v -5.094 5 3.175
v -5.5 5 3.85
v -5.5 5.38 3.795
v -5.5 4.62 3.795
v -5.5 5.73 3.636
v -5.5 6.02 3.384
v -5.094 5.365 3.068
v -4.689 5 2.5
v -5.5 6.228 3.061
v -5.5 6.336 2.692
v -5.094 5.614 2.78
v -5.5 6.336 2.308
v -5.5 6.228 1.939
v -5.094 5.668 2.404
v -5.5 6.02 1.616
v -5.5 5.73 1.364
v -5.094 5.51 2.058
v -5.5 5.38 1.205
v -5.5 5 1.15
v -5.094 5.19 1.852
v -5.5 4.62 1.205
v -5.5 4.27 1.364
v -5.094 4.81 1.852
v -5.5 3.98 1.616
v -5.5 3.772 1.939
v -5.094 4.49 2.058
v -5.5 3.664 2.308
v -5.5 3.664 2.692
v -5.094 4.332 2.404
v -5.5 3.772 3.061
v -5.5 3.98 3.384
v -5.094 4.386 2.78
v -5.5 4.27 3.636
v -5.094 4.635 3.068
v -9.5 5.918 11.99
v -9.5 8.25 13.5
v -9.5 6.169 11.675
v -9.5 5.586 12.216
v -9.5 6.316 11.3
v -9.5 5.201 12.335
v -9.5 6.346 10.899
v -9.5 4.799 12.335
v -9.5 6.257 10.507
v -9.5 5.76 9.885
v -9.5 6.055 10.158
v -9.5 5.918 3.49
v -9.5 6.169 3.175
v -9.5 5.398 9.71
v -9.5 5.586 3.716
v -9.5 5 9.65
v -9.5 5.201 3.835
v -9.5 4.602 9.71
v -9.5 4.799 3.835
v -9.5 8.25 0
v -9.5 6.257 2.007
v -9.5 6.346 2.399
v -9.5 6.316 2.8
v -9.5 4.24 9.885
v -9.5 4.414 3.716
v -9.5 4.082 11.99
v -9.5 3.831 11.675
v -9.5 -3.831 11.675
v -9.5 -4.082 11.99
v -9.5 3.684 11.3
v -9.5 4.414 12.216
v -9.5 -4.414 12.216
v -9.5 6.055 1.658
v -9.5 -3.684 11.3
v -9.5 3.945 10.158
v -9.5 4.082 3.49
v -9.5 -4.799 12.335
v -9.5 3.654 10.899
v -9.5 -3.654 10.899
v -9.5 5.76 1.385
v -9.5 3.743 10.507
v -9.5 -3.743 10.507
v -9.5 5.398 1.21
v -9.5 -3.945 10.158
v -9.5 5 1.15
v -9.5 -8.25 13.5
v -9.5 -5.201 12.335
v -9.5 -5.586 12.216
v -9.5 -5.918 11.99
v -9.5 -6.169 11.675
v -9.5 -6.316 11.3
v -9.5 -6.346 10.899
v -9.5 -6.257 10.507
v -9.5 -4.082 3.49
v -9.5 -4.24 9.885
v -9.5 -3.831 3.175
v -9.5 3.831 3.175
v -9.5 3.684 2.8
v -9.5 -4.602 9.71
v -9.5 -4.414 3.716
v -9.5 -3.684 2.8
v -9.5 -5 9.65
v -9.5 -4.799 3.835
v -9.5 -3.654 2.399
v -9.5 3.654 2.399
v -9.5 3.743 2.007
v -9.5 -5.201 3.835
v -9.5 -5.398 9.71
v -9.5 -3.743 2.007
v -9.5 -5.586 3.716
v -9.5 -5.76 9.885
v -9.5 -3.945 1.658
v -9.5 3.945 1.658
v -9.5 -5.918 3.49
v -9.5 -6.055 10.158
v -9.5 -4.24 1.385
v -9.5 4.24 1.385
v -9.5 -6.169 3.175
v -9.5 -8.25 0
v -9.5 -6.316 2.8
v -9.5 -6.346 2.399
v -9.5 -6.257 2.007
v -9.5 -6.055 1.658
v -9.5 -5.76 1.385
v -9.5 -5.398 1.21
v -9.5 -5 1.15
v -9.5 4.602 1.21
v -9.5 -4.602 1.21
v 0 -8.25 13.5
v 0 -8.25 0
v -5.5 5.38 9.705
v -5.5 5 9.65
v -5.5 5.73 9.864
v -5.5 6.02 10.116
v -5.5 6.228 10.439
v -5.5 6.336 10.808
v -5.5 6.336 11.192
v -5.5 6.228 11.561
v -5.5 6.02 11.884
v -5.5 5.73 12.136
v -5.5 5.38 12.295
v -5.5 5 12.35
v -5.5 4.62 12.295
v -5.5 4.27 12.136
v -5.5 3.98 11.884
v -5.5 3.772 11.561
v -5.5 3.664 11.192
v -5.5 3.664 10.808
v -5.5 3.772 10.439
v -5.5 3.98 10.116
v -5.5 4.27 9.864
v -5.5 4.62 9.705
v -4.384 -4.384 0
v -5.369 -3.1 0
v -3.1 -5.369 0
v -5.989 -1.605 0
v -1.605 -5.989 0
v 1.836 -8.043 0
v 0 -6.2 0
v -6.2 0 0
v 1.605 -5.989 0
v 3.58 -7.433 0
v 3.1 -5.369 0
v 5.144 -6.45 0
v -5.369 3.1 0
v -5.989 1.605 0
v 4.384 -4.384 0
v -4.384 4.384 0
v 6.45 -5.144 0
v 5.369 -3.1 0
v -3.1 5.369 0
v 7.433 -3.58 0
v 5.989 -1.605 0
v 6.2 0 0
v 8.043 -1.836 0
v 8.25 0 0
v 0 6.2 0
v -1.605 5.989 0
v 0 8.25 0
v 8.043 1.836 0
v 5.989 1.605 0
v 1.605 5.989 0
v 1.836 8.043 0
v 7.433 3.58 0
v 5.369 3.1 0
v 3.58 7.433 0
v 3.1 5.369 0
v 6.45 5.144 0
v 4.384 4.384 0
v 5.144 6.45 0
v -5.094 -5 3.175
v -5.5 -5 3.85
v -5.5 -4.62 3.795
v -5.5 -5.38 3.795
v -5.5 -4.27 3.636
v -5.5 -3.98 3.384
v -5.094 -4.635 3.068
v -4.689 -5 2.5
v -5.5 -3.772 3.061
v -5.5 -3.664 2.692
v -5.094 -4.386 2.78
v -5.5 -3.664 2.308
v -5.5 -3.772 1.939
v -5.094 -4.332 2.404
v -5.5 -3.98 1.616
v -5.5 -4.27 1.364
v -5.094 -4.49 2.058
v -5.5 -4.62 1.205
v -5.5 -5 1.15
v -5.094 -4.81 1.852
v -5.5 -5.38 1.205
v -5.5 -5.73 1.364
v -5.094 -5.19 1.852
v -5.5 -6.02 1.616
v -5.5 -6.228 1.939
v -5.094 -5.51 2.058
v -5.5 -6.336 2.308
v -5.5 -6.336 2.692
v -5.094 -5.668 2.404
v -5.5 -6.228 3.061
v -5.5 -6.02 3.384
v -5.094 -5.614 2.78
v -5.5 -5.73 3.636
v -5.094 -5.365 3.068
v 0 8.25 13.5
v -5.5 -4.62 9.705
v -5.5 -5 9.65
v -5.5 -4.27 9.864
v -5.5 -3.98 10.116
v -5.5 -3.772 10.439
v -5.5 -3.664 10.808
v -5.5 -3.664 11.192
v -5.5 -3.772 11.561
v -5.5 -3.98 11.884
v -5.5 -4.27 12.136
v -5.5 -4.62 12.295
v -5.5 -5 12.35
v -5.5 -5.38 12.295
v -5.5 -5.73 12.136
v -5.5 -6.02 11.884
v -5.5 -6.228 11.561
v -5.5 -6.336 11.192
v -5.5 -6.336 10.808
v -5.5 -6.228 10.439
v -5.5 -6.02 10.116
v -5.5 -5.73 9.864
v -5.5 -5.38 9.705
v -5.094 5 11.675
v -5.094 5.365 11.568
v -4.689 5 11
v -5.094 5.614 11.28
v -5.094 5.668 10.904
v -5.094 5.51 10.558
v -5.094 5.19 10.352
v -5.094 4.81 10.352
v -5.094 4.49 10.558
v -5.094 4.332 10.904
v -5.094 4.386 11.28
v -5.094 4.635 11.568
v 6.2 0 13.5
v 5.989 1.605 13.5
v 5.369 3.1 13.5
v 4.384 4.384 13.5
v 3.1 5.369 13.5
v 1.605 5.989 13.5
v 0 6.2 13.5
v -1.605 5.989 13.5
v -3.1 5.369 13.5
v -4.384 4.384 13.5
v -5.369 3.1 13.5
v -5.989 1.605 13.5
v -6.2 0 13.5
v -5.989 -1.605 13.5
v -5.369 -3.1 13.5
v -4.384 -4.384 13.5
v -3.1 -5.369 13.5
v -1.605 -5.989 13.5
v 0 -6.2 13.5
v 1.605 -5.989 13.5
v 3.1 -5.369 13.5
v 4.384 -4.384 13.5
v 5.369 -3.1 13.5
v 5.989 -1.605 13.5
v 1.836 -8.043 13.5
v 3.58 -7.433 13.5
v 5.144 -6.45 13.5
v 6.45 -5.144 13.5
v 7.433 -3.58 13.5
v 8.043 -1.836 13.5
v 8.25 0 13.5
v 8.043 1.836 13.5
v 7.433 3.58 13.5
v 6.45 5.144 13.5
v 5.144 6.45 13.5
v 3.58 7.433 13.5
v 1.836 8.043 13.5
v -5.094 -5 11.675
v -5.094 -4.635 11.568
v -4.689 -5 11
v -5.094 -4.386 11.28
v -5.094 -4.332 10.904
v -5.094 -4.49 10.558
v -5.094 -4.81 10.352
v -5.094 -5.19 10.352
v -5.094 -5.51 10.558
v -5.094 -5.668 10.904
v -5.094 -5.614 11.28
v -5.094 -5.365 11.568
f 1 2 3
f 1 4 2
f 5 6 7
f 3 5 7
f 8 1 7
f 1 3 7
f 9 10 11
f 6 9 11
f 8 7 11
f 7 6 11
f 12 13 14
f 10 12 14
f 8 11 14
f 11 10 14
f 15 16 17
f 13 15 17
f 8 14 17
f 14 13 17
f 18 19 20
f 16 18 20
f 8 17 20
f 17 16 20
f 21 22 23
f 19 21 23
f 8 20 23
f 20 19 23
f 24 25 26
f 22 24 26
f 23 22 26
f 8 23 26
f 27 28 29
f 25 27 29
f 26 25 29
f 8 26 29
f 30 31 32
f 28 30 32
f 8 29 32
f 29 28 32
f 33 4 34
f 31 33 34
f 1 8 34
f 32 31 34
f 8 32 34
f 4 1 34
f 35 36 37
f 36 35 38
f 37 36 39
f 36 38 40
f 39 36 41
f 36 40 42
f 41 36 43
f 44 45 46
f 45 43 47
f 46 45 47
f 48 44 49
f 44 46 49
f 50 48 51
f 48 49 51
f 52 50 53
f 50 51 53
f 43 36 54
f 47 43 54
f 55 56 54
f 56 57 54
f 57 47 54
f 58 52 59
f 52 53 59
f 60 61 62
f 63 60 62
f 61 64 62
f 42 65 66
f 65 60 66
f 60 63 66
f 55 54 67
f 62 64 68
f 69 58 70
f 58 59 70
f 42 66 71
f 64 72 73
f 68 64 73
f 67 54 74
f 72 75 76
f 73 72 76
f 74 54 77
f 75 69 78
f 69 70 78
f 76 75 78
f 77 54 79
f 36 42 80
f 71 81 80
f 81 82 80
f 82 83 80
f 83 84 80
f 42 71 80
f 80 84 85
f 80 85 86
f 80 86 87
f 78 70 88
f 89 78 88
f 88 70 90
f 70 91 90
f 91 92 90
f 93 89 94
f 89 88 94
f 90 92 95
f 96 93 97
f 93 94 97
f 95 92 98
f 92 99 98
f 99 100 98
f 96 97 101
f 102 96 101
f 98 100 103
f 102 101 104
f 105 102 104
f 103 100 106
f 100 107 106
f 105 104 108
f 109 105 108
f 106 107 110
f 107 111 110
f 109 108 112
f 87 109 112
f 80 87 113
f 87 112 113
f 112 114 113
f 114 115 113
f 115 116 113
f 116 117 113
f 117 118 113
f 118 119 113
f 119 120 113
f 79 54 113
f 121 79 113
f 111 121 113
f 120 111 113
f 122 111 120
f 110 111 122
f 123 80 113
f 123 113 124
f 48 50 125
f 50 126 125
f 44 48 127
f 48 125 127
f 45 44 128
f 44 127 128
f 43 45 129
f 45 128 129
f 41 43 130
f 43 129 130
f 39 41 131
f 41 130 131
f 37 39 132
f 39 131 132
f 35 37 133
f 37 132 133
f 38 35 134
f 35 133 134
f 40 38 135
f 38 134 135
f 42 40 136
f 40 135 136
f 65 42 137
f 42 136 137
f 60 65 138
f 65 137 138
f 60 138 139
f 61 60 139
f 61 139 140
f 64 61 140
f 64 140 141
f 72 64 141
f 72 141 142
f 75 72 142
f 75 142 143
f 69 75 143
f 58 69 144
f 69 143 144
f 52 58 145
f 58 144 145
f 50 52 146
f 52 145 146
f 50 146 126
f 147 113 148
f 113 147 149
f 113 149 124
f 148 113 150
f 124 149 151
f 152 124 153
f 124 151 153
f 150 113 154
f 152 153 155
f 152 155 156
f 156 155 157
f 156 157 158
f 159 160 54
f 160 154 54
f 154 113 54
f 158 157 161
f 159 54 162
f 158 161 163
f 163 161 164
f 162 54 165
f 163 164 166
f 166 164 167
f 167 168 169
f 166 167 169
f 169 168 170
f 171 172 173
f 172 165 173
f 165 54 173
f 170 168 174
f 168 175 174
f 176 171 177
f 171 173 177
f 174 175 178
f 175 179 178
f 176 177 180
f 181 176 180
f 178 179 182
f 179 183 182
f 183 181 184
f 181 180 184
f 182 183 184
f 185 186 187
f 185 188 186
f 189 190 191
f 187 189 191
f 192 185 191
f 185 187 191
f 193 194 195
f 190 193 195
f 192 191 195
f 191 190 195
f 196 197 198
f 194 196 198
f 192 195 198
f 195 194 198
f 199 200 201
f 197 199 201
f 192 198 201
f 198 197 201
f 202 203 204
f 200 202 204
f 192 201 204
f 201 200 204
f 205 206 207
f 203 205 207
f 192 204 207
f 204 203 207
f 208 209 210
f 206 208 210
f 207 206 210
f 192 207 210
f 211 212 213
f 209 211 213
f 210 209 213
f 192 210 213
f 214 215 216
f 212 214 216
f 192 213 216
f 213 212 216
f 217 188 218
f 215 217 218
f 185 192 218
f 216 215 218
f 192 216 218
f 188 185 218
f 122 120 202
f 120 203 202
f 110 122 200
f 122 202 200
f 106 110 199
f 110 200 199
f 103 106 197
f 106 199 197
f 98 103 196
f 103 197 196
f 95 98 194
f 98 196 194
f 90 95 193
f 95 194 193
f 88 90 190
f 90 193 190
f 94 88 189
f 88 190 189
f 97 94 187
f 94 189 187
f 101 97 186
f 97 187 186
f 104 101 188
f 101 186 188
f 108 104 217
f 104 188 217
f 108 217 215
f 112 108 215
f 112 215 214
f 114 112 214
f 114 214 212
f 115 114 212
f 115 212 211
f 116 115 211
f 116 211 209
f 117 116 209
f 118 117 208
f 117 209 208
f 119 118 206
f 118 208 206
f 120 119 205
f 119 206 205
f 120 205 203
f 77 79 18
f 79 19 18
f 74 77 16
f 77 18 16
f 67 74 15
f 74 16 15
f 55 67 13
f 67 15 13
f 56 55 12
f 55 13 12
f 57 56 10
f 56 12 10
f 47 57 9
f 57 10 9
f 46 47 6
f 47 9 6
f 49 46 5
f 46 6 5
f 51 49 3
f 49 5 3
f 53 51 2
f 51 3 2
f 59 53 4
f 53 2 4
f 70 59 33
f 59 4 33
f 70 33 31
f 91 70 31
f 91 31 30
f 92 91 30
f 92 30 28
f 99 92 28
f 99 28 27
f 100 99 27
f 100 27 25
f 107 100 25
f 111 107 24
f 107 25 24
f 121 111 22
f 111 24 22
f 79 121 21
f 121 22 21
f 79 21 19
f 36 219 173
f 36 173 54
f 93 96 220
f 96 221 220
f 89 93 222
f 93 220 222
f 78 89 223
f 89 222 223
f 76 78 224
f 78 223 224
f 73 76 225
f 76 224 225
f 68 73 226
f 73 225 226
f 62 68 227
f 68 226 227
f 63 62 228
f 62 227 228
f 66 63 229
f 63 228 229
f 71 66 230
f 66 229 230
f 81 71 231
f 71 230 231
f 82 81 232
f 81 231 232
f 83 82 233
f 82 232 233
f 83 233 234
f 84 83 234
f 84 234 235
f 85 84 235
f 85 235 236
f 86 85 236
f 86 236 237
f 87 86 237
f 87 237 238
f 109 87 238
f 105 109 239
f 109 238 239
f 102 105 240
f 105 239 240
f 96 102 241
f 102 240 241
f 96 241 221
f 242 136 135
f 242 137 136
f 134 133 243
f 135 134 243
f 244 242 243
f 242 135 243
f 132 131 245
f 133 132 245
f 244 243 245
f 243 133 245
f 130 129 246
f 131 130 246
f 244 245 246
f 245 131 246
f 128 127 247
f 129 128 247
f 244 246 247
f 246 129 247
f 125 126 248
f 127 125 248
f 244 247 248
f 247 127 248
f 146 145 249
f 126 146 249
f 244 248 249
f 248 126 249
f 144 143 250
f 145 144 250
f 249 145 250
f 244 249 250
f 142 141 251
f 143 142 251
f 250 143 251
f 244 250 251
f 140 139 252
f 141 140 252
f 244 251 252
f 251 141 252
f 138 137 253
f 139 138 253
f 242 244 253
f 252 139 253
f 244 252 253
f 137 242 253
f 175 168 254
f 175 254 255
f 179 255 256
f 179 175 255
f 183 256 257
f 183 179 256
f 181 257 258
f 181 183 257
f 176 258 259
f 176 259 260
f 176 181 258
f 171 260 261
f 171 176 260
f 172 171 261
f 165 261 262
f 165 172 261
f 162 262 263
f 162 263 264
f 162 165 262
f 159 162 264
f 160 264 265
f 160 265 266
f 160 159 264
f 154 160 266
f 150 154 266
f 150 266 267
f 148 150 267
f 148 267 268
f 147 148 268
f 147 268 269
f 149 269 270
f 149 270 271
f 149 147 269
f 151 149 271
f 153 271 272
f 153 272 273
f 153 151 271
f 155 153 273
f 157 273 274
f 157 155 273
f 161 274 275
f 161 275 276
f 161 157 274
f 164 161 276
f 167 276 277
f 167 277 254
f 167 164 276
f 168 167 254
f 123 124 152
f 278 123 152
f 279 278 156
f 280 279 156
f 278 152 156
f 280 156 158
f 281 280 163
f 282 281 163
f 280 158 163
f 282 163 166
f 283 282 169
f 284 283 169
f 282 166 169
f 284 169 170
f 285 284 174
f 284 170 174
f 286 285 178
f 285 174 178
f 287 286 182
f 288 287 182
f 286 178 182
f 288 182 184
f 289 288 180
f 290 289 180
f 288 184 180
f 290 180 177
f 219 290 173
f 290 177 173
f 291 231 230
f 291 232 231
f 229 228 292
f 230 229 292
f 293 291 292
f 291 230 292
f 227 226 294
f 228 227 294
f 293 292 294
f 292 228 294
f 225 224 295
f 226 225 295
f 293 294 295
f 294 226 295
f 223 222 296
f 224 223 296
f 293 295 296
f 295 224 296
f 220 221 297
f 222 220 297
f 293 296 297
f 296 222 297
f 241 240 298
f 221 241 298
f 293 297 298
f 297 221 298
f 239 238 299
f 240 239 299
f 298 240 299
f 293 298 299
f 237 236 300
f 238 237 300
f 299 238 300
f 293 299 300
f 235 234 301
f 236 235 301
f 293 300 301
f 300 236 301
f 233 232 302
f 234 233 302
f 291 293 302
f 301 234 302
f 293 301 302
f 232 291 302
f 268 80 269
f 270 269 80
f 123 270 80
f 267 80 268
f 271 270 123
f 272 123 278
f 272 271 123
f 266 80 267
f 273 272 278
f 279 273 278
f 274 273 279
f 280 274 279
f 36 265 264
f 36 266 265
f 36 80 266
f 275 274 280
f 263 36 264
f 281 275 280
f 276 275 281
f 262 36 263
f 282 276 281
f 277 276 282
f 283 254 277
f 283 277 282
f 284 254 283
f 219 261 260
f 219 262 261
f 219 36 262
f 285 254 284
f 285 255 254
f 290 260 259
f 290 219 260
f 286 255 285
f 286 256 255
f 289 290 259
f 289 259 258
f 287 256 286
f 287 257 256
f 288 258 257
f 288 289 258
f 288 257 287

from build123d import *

# Parameters (mm, degrees)
SKETCH1_R                      = 6.2
BOSS_EXTRUDE1_DEPTH            = 13.5
F_2_7_2_7_DIAMETER_HOLE1_D     = 2.7
F_2_7_2_7_DIAMETER_HOLE1_DEPTH = 4
F_2_7_2_7_DIAMETER_HOLE1_TIP   = 0.811161836


with BuildPart() as part:
    # Sketch1 → Boss-Extrude1 (new body)
    with BuildSketch(Plane.XY):
        with BuildLine():
            Line((-9.5, 8.25), (-9.5, -8.25))
            Line((-9.5, -8.25), (0, -8.25))
            ThreePointArc((0, -8.25), (8.25, 0), (0, 8.25))
            Line((0, 8.25), (-9.5, 8.25))
        make_face()
        Circle(SKETCH1_R, mode=Mode.SUBTRACT)
    extrude(amount=BOSS_EXTRUDE1_DEPTH)

    # Ø2.7 (2.7) Diameter Hole1
    with Locations(Plane.ZY.offset(9.5)):
        with Locations((2.5, -5), (2.5, 5), (11, 5), (11, -5)):
            Hole(F_2_7_2_7_DIAMETER_HOLE1_D / 2, depth=F_2_7_2_7_DIAMETER_HOLE1_DEPTH)
            with Locations((0, 0, -(F_2_7_2_7_DIAMETER_HOLE1_DEPTH + F_2_7_2_7_DIAMETER_HOLE1_TIP / 2))):  # 118° drill point
                Cone(0, F_2_7_2_7_DIAMETER_HOLE1_D / 2, F_2_7_2_7_DIAMETER_HOLE1_TIP, mode=Mode.SUBTRACT)


solid = part.part
